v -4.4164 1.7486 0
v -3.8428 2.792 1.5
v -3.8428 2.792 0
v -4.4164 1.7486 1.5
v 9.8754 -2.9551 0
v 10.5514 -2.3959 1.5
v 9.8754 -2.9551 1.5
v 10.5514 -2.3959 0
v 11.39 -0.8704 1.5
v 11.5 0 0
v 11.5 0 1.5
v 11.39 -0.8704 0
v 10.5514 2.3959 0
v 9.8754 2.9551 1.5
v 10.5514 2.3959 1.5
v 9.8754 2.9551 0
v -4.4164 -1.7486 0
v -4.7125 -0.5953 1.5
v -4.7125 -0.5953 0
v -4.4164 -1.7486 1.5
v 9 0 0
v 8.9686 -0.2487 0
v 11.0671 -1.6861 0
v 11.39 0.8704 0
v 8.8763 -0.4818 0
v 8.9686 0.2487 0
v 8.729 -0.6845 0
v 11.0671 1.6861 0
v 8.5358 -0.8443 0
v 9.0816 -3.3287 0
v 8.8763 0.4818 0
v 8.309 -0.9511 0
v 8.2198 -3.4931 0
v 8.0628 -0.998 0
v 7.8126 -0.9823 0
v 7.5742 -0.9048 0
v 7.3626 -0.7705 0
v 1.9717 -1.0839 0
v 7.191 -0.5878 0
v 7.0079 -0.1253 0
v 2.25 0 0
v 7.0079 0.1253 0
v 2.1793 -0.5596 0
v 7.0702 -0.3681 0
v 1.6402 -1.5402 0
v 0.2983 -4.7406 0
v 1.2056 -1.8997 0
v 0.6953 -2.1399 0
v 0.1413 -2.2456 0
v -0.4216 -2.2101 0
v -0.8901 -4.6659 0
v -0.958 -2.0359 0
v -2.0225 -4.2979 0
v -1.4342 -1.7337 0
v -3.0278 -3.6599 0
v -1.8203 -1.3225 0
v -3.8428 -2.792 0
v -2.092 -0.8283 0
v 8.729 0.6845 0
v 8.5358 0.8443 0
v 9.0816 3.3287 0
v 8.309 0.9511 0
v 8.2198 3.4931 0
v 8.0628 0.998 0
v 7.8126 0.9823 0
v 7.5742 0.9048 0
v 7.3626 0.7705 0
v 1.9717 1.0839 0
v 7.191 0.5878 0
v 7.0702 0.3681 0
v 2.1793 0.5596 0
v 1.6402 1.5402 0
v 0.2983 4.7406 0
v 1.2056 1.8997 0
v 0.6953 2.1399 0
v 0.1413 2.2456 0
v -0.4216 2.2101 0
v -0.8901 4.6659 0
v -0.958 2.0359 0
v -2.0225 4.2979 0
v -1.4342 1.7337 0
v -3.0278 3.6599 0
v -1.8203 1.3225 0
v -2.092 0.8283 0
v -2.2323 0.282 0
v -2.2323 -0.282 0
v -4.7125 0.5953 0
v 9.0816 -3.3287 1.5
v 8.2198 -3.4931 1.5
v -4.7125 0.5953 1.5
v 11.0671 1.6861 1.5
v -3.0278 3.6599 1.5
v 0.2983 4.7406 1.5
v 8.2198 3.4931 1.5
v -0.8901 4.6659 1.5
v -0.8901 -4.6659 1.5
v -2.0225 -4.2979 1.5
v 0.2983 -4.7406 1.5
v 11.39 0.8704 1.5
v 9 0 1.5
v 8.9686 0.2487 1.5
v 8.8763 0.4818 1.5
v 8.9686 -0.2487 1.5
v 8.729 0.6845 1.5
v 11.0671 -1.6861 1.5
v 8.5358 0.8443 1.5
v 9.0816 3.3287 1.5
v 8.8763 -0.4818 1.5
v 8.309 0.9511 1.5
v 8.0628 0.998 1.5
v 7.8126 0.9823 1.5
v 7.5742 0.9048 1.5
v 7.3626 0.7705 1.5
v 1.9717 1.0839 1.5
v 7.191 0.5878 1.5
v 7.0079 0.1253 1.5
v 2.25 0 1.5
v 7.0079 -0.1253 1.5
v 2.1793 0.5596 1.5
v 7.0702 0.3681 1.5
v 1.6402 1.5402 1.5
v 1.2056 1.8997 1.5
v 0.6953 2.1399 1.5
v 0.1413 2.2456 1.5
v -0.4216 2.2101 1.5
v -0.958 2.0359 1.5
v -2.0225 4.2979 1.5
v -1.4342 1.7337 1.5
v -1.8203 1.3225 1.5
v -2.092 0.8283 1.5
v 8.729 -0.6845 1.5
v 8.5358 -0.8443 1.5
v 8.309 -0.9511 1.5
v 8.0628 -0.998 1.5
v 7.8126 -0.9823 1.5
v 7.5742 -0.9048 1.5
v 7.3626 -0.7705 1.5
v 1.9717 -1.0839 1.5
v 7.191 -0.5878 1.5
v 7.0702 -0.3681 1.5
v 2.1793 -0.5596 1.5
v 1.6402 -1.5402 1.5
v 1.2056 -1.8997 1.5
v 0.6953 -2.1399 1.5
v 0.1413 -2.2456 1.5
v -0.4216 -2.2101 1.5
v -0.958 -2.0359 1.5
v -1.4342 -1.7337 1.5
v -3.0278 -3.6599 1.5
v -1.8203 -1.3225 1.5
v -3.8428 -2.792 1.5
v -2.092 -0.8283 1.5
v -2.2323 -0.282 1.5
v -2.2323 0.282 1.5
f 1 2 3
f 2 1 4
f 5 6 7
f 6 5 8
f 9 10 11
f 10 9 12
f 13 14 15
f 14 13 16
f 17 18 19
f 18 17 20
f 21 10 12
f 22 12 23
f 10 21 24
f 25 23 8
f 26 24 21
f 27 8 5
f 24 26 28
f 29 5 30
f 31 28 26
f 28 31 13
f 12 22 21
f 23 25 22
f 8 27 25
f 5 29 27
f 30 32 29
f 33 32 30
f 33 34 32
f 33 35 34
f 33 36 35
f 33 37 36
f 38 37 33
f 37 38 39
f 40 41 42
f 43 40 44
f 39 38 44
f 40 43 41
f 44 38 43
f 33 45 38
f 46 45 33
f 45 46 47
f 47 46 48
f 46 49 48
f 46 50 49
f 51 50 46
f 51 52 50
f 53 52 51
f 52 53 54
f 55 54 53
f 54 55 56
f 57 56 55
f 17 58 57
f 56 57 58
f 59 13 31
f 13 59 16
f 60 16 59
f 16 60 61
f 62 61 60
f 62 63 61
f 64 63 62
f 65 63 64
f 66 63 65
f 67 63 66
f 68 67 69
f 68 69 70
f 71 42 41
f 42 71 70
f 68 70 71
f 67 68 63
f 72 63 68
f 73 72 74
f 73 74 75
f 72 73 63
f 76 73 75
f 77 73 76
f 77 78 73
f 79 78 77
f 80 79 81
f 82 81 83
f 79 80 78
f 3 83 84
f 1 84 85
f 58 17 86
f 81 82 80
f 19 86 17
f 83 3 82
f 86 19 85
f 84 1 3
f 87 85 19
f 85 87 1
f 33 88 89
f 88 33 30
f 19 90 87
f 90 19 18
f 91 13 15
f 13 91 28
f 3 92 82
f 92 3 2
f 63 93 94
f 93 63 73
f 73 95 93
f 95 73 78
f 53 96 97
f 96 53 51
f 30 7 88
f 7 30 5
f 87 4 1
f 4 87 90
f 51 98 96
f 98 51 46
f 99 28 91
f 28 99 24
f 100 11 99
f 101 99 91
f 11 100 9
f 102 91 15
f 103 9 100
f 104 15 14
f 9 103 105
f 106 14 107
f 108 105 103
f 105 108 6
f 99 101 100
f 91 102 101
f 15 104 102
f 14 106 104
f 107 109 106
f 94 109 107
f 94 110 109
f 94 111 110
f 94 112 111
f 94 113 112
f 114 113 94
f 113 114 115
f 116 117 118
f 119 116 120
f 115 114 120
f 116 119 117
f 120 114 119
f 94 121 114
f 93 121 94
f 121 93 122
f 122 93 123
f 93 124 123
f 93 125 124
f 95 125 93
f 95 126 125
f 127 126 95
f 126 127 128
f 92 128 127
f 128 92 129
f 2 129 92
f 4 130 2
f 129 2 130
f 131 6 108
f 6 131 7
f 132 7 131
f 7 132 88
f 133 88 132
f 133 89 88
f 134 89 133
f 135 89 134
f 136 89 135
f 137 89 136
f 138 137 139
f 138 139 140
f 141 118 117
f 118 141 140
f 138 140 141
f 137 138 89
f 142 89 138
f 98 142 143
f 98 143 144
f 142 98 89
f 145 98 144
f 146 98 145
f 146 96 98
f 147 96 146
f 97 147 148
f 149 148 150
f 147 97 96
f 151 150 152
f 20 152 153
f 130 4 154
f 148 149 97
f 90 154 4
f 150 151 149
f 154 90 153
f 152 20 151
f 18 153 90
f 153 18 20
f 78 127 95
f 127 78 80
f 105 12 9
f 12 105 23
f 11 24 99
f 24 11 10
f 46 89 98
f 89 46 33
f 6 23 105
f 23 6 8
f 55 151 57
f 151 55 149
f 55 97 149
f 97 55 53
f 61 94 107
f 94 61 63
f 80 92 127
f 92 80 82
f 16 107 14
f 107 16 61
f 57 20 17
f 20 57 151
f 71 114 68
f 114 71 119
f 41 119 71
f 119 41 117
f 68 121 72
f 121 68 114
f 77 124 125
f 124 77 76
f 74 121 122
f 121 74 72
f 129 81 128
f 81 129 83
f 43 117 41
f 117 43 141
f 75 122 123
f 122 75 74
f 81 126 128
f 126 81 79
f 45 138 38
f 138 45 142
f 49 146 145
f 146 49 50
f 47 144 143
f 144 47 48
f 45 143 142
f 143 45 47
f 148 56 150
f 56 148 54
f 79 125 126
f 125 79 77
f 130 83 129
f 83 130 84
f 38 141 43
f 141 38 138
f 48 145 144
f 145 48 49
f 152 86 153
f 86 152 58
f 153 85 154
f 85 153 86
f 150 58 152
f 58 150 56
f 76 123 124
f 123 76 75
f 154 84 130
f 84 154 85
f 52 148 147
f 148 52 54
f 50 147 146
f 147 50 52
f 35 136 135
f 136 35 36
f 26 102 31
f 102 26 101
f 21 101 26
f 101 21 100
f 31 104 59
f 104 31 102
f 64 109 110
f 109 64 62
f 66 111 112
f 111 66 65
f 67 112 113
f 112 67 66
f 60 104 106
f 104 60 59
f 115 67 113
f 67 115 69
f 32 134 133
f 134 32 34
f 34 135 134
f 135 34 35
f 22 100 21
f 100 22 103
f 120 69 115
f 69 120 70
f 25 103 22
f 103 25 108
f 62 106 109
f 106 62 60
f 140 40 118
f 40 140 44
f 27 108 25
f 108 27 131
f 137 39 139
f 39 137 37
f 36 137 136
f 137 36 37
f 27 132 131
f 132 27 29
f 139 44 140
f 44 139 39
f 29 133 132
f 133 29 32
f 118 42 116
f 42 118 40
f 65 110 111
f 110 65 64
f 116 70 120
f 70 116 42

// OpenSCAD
$fn=25;

wall_thk = 2.5;

ring_id = 4.5;
ring_od = ring_id + 2*wall_thk;

string_hole_id = 2;
string_hole_od = string_hole_id + 2*wall_thk;


thk = 1.5;
hole_centres = 8;

difference()
{
hull()
{
    cylinder(d=ring_od,h=thk);
    translate([hole_centres,0,0])
    cylinder(d=string_hole_od,h=thk);
}

    cylinder(d=ring_id,h=thk);
    translate([hole_centres,0,0])
        cylinder(d=string_hole_id,h=thk);
}
